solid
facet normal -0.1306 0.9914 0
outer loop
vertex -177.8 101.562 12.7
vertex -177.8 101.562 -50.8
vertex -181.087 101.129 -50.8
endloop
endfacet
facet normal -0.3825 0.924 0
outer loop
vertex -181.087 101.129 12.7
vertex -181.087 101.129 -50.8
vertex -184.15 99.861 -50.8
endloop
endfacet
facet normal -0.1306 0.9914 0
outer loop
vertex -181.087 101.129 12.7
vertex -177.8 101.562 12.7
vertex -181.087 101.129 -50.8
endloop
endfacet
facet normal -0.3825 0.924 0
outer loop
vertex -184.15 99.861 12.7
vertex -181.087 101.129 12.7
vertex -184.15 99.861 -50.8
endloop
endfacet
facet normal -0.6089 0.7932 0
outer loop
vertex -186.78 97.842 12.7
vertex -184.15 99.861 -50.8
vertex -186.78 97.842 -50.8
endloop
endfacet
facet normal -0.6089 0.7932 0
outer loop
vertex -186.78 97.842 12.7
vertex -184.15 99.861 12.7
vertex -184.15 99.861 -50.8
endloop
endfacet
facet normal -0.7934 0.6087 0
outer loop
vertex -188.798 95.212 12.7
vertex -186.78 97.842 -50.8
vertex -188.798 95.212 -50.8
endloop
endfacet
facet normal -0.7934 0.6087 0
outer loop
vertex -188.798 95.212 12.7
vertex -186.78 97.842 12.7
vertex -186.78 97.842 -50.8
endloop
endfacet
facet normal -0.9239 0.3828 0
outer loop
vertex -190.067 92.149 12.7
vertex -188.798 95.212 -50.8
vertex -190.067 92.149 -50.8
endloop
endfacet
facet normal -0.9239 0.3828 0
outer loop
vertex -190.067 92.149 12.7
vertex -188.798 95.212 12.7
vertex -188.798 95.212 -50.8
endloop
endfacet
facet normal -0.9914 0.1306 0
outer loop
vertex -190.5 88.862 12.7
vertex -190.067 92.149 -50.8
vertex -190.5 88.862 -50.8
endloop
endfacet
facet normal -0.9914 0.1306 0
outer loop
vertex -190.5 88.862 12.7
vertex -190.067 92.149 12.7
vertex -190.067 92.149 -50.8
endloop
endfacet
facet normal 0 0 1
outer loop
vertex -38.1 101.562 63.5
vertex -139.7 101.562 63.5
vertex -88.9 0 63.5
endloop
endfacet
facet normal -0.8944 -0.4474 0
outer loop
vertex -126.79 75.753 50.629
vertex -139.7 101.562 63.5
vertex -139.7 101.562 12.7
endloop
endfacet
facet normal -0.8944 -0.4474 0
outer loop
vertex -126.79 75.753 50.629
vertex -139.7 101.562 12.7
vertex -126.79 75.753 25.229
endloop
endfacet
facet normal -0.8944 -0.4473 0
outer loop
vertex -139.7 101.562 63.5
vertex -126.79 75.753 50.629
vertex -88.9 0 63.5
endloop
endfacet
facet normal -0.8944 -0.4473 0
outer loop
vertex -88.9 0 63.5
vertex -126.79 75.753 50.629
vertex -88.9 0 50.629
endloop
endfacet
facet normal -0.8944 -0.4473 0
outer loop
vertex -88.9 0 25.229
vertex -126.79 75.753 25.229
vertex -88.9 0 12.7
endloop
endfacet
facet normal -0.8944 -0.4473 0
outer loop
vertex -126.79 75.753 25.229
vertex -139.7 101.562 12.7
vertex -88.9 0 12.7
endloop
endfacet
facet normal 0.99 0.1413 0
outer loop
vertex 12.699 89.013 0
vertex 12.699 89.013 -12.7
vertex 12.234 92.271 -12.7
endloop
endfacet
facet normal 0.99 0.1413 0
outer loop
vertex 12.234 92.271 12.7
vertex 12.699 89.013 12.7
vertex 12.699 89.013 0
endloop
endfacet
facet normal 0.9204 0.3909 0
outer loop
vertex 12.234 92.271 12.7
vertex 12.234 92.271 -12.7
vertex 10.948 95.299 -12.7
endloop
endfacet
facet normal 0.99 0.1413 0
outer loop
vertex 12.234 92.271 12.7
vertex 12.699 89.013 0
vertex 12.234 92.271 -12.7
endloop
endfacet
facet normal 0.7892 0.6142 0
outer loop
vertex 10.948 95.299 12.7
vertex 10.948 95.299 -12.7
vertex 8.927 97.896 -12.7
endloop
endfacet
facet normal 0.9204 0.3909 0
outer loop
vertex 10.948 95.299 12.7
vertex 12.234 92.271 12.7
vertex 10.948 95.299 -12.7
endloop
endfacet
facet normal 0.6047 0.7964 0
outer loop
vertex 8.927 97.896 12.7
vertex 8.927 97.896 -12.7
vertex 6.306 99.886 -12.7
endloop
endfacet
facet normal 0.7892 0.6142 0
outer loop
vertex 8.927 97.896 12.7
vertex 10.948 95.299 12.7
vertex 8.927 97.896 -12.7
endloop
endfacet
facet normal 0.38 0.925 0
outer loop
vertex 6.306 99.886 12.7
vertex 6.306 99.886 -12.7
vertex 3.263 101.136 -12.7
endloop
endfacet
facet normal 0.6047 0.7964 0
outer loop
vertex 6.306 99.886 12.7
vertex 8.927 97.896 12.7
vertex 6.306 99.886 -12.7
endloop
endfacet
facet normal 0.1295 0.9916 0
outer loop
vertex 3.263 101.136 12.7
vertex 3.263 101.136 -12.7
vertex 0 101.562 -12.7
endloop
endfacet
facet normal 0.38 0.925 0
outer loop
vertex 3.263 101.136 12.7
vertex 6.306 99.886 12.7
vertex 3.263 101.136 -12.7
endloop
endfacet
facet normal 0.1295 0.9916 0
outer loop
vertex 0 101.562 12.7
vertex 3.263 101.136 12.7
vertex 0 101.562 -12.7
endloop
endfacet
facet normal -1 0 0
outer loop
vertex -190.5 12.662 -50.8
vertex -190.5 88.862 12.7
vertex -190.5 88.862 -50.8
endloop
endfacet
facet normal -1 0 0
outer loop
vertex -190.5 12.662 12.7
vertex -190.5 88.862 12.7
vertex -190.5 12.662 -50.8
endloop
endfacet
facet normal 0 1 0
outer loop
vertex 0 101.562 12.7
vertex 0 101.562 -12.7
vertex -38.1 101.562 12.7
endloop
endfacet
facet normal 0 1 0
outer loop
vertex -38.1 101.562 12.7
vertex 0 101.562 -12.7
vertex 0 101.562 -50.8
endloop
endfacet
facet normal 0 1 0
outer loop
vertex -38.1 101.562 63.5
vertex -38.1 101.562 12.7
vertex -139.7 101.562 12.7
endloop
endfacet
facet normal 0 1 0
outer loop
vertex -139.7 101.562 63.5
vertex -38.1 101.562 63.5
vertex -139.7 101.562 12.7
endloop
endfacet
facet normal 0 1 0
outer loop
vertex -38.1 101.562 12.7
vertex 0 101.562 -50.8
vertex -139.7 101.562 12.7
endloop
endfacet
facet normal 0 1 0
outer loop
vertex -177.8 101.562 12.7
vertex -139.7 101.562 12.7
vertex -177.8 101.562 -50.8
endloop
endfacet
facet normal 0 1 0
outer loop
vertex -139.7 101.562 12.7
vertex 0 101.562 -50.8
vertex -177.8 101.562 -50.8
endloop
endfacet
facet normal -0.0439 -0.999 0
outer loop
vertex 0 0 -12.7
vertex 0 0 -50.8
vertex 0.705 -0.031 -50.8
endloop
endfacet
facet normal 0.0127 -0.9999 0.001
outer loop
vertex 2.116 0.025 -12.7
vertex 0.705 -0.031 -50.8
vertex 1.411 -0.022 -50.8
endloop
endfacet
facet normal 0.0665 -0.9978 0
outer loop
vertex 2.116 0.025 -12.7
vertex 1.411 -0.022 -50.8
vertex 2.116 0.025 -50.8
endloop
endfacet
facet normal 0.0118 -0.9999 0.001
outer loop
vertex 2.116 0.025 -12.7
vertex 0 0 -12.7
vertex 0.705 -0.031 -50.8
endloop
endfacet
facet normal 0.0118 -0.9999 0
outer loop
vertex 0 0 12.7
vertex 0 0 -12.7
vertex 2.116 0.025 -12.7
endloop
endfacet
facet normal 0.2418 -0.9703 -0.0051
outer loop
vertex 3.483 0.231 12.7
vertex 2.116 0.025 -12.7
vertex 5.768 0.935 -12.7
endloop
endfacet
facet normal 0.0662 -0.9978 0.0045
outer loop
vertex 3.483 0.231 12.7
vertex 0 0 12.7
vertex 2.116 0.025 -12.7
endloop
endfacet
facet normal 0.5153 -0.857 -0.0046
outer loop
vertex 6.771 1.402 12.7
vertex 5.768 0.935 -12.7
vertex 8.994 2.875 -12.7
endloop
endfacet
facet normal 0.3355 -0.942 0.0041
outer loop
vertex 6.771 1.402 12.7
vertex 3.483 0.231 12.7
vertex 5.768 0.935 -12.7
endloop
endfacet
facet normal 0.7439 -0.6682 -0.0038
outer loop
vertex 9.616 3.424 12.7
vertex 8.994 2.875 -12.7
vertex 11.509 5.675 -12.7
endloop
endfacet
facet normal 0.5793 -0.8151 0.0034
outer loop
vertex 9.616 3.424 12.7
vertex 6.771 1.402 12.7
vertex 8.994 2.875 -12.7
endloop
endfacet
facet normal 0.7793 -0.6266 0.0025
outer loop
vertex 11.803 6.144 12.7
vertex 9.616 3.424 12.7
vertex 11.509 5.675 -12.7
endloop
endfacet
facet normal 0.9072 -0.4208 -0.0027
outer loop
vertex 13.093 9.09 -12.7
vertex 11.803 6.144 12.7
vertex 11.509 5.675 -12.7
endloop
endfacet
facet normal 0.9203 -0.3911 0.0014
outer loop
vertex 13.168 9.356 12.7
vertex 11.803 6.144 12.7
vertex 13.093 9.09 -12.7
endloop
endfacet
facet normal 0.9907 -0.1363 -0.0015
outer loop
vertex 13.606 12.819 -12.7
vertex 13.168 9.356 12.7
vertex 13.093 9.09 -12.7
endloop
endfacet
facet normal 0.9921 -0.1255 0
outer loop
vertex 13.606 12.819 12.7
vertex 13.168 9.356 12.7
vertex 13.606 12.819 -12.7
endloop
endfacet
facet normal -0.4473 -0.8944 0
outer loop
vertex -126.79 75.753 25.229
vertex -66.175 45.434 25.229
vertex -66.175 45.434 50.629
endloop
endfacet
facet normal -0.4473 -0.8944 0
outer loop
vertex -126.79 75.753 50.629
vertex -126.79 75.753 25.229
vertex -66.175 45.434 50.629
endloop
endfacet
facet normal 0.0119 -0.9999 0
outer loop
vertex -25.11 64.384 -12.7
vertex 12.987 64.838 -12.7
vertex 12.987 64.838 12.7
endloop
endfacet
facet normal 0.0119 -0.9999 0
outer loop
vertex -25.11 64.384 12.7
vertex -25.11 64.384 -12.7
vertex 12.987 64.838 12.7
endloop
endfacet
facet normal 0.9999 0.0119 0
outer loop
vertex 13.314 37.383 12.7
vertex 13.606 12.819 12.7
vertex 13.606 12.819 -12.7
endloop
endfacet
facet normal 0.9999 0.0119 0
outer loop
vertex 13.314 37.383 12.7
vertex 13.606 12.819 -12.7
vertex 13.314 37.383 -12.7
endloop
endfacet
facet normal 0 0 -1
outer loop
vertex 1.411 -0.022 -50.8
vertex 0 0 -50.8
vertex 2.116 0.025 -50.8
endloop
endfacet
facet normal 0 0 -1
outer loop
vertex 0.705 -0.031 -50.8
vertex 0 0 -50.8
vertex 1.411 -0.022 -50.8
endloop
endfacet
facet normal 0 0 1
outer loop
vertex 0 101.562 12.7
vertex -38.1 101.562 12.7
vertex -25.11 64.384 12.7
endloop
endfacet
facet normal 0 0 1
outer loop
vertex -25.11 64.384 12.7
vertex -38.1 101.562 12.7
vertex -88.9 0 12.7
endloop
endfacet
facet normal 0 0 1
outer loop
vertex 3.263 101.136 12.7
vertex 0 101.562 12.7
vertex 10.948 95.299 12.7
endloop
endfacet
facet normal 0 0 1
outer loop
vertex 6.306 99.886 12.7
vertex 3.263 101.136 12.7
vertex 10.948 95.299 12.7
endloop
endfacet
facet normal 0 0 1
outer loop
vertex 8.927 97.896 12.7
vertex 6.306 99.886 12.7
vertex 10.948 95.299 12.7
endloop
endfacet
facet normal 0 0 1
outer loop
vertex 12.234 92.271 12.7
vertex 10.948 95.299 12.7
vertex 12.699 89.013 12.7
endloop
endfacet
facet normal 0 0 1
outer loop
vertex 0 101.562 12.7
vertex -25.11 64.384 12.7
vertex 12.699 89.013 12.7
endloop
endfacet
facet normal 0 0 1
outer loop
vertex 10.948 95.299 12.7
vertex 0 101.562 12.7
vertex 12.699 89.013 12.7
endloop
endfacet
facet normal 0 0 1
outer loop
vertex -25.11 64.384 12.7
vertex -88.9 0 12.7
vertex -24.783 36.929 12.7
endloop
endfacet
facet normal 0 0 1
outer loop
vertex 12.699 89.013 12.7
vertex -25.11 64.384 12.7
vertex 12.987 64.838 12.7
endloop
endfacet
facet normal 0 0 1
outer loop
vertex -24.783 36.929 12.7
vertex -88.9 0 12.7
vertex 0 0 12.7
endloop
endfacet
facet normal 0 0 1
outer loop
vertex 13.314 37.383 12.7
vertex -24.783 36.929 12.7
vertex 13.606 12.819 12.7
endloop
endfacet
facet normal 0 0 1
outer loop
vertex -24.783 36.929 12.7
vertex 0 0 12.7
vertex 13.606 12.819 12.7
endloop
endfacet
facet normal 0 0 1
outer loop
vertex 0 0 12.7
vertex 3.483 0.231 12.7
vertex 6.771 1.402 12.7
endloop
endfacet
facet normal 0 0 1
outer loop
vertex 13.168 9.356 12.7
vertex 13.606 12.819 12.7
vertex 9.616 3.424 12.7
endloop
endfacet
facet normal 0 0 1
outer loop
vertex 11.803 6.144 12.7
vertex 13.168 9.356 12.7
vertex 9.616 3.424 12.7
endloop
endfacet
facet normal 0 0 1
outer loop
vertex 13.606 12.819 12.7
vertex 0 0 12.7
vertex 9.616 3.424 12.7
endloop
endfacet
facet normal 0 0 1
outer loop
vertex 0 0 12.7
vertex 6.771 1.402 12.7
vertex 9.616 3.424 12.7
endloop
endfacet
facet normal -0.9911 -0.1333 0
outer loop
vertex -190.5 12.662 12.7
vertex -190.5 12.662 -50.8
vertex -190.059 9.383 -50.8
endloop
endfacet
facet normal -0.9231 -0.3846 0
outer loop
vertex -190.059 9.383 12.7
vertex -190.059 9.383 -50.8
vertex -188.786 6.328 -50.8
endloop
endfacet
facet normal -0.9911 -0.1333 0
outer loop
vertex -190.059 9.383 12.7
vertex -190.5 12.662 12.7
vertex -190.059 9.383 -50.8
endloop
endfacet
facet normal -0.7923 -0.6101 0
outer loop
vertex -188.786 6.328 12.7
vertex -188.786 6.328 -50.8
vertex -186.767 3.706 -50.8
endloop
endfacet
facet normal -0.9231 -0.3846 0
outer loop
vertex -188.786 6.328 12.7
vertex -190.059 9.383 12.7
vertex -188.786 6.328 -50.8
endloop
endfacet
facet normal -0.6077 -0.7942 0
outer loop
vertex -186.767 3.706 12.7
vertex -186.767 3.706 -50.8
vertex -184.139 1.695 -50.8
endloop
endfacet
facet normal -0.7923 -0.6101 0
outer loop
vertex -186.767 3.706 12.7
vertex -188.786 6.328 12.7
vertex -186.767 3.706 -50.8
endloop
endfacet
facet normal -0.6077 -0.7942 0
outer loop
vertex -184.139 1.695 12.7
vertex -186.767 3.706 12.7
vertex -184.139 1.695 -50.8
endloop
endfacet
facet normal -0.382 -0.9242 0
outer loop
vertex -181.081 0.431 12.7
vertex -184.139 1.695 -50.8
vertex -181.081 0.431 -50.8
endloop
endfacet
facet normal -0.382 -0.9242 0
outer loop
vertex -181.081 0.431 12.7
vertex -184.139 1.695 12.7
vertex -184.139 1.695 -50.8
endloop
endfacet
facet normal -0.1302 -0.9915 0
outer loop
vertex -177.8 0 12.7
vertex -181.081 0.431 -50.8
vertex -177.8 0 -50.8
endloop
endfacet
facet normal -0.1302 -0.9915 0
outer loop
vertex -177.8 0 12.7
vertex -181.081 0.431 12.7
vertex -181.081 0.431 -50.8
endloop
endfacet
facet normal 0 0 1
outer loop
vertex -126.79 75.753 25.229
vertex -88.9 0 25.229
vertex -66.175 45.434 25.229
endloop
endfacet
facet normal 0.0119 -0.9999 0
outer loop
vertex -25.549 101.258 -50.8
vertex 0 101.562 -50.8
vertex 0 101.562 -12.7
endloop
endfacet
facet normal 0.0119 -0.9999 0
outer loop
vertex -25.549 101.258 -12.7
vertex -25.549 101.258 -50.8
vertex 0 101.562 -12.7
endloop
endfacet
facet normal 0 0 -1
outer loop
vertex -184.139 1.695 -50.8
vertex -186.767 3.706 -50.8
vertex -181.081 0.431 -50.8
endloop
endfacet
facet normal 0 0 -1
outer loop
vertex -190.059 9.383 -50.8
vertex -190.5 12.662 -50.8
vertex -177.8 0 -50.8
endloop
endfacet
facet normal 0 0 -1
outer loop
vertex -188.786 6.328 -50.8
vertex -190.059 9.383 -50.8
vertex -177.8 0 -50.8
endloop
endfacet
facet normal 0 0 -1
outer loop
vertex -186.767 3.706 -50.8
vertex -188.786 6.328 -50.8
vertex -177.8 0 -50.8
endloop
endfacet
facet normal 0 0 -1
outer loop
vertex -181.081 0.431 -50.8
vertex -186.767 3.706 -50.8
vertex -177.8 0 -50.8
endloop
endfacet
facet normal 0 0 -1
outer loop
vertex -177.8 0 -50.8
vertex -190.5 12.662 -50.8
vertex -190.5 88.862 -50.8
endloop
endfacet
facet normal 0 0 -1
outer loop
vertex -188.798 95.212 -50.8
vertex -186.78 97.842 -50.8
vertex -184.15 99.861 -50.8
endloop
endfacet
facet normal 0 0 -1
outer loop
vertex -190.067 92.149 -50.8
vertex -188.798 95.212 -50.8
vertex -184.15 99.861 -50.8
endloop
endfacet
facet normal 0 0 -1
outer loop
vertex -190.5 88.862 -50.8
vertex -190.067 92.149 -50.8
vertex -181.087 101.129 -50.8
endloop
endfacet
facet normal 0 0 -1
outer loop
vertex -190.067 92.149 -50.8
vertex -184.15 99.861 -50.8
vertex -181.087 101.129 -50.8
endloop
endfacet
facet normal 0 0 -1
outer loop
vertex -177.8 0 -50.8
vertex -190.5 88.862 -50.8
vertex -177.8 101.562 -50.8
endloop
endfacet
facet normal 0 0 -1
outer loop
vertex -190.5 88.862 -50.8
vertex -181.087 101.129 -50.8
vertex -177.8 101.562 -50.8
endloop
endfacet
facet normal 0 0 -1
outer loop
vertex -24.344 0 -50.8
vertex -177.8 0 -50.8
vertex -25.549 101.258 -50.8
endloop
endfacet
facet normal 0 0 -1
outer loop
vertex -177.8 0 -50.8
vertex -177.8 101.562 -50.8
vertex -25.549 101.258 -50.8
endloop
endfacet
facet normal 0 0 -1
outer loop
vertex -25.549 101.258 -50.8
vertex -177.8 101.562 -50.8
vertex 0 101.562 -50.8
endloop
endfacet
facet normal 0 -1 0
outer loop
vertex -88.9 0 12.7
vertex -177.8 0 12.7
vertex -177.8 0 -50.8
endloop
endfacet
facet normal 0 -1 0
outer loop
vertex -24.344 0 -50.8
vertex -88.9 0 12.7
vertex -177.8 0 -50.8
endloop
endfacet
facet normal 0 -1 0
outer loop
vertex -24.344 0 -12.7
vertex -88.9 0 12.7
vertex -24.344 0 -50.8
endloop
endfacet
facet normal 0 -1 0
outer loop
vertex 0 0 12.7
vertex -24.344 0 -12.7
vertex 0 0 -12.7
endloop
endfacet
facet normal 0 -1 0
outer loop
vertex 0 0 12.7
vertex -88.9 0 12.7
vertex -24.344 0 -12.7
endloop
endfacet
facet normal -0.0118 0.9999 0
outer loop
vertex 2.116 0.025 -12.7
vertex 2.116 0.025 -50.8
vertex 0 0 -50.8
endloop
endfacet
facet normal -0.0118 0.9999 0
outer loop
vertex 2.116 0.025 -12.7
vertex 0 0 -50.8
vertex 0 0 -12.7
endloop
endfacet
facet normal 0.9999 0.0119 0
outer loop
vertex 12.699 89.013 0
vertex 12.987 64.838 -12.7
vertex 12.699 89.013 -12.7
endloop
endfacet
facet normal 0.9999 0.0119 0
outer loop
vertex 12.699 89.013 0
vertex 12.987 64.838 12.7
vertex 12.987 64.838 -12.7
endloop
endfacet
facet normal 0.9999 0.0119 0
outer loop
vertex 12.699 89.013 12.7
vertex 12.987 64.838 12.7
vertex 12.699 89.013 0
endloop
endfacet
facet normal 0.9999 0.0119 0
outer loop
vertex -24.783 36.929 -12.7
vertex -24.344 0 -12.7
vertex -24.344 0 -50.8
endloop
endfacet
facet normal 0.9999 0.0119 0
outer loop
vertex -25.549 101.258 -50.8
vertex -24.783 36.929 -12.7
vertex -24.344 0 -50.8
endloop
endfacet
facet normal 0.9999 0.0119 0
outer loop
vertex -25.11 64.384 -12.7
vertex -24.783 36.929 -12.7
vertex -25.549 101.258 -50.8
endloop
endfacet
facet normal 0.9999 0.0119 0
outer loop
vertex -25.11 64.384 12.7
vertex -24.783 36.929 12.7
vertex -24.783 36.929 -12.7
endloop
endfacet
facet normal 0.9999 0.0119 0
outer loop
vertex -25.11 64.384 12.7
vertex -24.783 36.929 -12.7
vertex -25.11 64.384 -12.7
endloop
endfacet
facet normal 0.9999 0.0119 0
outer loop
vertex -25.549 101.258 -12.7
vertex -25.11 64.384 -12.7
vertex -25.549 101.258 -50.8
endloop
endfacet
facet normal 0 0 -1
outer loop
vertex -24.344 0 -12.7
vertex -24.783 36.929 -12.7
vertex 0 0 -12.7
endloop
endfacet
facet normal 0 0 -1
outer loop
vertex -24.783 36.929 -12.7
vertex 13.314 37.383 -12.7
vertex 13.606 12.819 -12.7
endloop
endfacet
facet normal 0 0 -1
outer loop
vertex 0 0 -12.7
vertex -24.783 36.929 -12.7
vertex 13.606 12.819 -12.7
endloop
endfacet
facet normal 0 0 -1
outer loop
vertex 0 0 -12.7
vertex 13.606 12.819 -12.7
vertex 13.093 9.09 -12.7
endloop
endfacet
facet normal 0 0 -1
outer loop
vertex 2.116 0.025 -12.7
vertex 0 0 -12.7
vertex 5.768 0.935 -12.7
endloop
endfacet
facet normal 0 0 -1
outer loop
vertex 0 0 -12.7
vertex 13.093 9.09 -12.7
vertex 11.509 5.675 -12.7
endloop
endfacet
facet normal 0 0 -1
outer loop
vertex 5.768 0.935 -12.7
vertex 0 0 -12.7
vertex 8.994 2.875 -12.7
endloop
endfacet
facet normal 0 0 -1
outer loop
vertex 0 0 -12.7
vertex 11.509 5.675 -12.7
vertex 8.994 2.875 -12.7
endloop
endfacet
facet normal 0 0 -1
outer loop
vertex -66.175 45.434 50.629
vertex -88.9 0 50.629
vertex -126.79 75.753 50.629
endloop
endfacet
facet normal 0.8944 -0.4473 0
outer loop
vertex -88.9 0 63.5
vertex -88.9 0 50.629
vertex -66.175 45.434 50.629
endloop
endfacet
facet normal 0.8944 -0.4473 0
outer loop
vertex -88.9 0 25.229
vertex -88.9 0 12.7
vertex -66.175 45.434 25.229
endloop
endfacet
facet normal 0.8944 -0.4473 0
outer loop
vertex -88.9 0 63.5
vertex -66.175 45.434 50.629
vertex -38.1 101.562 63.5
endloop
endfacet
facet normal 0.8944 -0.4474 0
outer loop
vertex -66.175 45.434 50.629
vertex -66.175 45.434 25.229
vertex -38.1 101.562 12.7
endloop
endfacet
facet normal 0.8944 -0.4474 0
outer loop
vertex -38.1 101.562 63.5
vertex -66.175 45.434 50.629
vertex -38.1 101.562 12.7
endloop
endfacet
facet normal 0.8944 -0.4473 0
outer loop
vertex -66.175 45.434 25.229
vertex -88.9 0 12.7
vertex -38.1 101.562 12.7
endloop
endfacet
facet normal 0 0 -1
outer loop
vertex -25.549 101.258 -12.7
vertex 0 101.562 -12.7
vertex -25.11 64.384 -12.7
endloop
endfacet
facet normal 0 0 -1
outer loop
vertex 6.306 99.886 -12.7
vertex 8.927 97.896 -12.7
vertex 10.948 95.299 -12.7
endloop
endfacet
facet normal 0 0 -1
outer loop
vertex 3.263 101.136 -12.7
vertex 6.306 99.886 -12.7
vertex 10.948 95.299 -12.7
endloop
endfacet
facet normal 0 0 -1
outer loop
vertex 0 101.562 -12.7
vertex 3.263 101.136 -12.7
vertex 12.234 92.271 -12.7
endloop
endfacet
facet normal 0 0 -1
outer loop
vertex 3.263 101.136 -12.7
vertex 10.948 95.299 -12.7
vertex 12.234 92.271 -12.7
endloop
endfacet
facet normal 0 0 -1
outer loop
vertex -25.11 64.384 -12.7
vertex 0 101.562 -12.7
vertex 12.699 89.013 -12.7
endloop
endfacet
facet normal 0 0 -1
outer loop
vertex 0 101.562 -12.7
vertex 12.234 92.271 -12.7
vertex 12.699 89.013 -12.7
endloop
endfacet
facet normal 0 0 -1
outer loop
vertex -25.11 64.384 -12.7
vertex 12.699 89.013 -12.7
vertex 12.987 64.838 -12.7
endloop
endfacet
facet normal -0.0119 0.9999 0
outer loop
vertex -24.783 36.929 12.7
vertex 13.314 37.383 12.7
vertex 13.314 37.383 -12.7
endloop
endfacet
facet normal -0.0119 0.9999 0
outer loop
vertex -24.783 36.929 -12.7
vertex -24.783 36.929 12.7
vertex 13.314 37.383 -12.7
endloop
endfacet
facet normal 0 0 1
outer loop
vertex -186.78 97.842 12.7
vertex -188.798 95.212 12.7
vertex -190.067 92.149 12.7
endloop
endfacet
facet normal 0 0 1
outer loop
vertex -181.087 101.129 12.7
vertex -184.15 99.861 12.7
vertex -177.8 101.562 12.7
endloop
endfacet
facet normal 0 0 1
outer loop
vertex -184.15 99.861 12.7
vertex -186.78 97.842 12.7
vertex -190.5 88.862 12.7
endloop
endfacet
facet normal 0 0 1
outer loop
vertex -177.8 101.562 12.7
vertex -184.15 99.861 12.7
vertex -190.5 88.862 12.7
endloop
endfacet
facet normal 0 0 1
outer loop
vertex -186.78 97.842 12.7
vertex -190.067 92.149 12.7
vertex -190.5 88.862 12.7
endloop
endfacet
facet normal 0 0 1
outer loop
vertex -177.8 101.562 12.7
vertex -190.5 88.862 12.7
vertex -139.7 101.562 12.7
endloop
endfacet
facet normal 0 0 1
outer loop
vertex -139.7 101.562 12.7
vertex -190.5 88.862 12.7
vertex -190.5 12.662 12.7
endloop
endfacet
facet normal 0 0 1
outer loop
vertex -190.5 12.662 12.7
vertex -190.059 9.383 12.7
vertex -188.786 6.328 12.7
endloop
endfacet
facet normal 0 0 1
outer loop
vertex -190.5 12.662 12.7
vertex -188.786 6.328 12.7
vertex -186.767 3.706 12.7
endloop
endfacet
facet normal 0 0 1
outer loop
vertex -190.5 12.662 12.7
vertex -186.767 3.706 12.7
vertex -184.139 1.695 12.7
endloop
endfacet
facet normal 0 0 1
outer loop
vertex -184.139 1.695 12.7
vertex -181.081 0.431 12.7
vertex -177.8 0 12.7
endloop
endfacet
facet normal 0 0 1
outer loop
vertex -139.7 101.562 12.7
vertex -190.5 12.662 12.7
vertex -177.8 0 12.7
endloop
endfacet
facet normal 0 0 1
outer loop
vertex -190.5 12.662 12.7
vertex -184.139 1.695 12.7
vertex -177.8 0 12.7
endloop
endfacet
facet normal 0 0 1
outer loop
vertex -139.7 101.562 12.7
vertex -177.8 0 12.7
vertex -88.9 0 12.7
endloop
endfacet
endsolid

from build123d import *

# Parameters (mm, degrees)
F1_DEPTH = 50.8
F3_DEPTH = 63.5
F4_W     = 50.8
F4_H     = 25.4
F5_DEPTH = 136.301493178
F6_W     = 12.6990998109
F6_H     = 38.1
F6_W_2   = 12.6558531163
F7_DEPTH = 38.1


with BuildPart() as f1:
    # F0 (on Top) → F1 (new body)
    with BuildSketch(Plane.XY):
        with BuildLine():
            Line((-177.8, 0), (0, 0))
            ThreePointArc((0, 0), (9.6159869033, 3.4237488703), (13.6063504562, 12.8187613327))
            Line((13.6063504562, 12.8187613327), (12.6990998109, 89.0133601981))
            ThreePointArc((12.6990998109, 89.0133601981), (8.9266357829, 97.8957099488), (0, 101.5621517573))
            Line((0, 101.5621517573), (-177.8, 101.5621517573))
            ThreePointArc((-177.8, 101.5621517573), (-186.7802196632, 97.842387939), (-190.4999436027, 88.8621517574))
            Line((-190.4999436027, 88.8621517574), (-190.4999436027, 12.6621517574))
            ThreePointArc((-190.4999436027, 12.6621517574), (-186.766864762, 3.7063724593), (-177.8, 0))
        make_face()
    extrude(amount=-F1_DEPTH)

    # F2 (on face) + F1_face1 (on face) → F3 (join)
    with BuildSketch(Plane.XY):
        Polygon((-38.1, 101.5621517573), (-139.7, 101.5621517573), (-88.9, 0), align=None)
    with BuildSketch(Plane(origin=(-88.6706320233, 50.7338080348, -50.8), x_dir=(1, 0, 0), z_dir=(0, 0, -1))):
        with BuildLine():
            ThreePointArc((-89.1293679767, 50.7338080348), (-98.0962327387, 47.0274355755), (-101.8293115794, 38.0716562774))
            Line((-101.8293115794, 38.0716562774), (-101.8293115794, -38.1283437226))
            ThreePointArc((-101.8293115794, -38.1283437226), (-98.1095876399, -47.1085799042), (-89.1293679767, -50.8283437225))
            Line((-89.1293679767, -50.8283437225), (88.6706320233, -50.8283437225))
            ThreePointArc((88.6706320233, -50.8283437225), (97.5972678062, -47.161901914), (101.3697318342, -38.2795521634))
            Line((101.3697318342, -38.2795521634), (102.2769824795, 37.9150467021))
            ThreePointArc((102.2769824795, 37.9150467021), (98.2866189266, 47.3100591645), (88.6706320233, 50.7338080348))
            Line((88.6706320233, 50.7338080348), (-89.1293679767, 50.7338080348))
        make_face()
    extrude(amount=F3_DEPTH, dir=(0, 0, 1))

    # F4 (on face) → F5 (cut, through all)
    with BuildSketch(Plane(origin=(-71.109398148, 35.5679489201, 0), x_dir=(0.4473469078, 0.8943605224, 0), z_dir=(0.8943605224, -0.4473469078, 0))):
        with Locations((-14.3691401044, 37.928833447)):
            Rectangle(F4_W, F4_H)
    extrude(amount=-F5_DEPTH, mode=Mode.SUBTRACT)

    # F6 (on face) → F7 (cut)
    with BuildSketch(Plane(origin=(13.7570332765, 0.1638052763, 0), x_dir=(-0.0119061764, 0.999929119, 0), z_dir=(0.999929119, 0.0119061764, 0))):
        with Locations((95.2054030218, -31.75)):
            Rectangle(F6_W, F6_H)
        with Locations((6.3279265582, -31.75)):
            Rectangle(F6_W_2, F6_H)
        Polygon((64.6785830399, 12.7), (37.2213781047, 12.7), (37.2213781047, -12.7), (12.6558531163, -12.7), (12.6558531163, -50.8), (88.8558531163, -50.8), (88.8558531163, -12.7), (64.6785830399, -12.7), align=None)
    extrude(amount=-F7_DEPTH, mode=Mode.SUBTRACT)


solid = f1.part
